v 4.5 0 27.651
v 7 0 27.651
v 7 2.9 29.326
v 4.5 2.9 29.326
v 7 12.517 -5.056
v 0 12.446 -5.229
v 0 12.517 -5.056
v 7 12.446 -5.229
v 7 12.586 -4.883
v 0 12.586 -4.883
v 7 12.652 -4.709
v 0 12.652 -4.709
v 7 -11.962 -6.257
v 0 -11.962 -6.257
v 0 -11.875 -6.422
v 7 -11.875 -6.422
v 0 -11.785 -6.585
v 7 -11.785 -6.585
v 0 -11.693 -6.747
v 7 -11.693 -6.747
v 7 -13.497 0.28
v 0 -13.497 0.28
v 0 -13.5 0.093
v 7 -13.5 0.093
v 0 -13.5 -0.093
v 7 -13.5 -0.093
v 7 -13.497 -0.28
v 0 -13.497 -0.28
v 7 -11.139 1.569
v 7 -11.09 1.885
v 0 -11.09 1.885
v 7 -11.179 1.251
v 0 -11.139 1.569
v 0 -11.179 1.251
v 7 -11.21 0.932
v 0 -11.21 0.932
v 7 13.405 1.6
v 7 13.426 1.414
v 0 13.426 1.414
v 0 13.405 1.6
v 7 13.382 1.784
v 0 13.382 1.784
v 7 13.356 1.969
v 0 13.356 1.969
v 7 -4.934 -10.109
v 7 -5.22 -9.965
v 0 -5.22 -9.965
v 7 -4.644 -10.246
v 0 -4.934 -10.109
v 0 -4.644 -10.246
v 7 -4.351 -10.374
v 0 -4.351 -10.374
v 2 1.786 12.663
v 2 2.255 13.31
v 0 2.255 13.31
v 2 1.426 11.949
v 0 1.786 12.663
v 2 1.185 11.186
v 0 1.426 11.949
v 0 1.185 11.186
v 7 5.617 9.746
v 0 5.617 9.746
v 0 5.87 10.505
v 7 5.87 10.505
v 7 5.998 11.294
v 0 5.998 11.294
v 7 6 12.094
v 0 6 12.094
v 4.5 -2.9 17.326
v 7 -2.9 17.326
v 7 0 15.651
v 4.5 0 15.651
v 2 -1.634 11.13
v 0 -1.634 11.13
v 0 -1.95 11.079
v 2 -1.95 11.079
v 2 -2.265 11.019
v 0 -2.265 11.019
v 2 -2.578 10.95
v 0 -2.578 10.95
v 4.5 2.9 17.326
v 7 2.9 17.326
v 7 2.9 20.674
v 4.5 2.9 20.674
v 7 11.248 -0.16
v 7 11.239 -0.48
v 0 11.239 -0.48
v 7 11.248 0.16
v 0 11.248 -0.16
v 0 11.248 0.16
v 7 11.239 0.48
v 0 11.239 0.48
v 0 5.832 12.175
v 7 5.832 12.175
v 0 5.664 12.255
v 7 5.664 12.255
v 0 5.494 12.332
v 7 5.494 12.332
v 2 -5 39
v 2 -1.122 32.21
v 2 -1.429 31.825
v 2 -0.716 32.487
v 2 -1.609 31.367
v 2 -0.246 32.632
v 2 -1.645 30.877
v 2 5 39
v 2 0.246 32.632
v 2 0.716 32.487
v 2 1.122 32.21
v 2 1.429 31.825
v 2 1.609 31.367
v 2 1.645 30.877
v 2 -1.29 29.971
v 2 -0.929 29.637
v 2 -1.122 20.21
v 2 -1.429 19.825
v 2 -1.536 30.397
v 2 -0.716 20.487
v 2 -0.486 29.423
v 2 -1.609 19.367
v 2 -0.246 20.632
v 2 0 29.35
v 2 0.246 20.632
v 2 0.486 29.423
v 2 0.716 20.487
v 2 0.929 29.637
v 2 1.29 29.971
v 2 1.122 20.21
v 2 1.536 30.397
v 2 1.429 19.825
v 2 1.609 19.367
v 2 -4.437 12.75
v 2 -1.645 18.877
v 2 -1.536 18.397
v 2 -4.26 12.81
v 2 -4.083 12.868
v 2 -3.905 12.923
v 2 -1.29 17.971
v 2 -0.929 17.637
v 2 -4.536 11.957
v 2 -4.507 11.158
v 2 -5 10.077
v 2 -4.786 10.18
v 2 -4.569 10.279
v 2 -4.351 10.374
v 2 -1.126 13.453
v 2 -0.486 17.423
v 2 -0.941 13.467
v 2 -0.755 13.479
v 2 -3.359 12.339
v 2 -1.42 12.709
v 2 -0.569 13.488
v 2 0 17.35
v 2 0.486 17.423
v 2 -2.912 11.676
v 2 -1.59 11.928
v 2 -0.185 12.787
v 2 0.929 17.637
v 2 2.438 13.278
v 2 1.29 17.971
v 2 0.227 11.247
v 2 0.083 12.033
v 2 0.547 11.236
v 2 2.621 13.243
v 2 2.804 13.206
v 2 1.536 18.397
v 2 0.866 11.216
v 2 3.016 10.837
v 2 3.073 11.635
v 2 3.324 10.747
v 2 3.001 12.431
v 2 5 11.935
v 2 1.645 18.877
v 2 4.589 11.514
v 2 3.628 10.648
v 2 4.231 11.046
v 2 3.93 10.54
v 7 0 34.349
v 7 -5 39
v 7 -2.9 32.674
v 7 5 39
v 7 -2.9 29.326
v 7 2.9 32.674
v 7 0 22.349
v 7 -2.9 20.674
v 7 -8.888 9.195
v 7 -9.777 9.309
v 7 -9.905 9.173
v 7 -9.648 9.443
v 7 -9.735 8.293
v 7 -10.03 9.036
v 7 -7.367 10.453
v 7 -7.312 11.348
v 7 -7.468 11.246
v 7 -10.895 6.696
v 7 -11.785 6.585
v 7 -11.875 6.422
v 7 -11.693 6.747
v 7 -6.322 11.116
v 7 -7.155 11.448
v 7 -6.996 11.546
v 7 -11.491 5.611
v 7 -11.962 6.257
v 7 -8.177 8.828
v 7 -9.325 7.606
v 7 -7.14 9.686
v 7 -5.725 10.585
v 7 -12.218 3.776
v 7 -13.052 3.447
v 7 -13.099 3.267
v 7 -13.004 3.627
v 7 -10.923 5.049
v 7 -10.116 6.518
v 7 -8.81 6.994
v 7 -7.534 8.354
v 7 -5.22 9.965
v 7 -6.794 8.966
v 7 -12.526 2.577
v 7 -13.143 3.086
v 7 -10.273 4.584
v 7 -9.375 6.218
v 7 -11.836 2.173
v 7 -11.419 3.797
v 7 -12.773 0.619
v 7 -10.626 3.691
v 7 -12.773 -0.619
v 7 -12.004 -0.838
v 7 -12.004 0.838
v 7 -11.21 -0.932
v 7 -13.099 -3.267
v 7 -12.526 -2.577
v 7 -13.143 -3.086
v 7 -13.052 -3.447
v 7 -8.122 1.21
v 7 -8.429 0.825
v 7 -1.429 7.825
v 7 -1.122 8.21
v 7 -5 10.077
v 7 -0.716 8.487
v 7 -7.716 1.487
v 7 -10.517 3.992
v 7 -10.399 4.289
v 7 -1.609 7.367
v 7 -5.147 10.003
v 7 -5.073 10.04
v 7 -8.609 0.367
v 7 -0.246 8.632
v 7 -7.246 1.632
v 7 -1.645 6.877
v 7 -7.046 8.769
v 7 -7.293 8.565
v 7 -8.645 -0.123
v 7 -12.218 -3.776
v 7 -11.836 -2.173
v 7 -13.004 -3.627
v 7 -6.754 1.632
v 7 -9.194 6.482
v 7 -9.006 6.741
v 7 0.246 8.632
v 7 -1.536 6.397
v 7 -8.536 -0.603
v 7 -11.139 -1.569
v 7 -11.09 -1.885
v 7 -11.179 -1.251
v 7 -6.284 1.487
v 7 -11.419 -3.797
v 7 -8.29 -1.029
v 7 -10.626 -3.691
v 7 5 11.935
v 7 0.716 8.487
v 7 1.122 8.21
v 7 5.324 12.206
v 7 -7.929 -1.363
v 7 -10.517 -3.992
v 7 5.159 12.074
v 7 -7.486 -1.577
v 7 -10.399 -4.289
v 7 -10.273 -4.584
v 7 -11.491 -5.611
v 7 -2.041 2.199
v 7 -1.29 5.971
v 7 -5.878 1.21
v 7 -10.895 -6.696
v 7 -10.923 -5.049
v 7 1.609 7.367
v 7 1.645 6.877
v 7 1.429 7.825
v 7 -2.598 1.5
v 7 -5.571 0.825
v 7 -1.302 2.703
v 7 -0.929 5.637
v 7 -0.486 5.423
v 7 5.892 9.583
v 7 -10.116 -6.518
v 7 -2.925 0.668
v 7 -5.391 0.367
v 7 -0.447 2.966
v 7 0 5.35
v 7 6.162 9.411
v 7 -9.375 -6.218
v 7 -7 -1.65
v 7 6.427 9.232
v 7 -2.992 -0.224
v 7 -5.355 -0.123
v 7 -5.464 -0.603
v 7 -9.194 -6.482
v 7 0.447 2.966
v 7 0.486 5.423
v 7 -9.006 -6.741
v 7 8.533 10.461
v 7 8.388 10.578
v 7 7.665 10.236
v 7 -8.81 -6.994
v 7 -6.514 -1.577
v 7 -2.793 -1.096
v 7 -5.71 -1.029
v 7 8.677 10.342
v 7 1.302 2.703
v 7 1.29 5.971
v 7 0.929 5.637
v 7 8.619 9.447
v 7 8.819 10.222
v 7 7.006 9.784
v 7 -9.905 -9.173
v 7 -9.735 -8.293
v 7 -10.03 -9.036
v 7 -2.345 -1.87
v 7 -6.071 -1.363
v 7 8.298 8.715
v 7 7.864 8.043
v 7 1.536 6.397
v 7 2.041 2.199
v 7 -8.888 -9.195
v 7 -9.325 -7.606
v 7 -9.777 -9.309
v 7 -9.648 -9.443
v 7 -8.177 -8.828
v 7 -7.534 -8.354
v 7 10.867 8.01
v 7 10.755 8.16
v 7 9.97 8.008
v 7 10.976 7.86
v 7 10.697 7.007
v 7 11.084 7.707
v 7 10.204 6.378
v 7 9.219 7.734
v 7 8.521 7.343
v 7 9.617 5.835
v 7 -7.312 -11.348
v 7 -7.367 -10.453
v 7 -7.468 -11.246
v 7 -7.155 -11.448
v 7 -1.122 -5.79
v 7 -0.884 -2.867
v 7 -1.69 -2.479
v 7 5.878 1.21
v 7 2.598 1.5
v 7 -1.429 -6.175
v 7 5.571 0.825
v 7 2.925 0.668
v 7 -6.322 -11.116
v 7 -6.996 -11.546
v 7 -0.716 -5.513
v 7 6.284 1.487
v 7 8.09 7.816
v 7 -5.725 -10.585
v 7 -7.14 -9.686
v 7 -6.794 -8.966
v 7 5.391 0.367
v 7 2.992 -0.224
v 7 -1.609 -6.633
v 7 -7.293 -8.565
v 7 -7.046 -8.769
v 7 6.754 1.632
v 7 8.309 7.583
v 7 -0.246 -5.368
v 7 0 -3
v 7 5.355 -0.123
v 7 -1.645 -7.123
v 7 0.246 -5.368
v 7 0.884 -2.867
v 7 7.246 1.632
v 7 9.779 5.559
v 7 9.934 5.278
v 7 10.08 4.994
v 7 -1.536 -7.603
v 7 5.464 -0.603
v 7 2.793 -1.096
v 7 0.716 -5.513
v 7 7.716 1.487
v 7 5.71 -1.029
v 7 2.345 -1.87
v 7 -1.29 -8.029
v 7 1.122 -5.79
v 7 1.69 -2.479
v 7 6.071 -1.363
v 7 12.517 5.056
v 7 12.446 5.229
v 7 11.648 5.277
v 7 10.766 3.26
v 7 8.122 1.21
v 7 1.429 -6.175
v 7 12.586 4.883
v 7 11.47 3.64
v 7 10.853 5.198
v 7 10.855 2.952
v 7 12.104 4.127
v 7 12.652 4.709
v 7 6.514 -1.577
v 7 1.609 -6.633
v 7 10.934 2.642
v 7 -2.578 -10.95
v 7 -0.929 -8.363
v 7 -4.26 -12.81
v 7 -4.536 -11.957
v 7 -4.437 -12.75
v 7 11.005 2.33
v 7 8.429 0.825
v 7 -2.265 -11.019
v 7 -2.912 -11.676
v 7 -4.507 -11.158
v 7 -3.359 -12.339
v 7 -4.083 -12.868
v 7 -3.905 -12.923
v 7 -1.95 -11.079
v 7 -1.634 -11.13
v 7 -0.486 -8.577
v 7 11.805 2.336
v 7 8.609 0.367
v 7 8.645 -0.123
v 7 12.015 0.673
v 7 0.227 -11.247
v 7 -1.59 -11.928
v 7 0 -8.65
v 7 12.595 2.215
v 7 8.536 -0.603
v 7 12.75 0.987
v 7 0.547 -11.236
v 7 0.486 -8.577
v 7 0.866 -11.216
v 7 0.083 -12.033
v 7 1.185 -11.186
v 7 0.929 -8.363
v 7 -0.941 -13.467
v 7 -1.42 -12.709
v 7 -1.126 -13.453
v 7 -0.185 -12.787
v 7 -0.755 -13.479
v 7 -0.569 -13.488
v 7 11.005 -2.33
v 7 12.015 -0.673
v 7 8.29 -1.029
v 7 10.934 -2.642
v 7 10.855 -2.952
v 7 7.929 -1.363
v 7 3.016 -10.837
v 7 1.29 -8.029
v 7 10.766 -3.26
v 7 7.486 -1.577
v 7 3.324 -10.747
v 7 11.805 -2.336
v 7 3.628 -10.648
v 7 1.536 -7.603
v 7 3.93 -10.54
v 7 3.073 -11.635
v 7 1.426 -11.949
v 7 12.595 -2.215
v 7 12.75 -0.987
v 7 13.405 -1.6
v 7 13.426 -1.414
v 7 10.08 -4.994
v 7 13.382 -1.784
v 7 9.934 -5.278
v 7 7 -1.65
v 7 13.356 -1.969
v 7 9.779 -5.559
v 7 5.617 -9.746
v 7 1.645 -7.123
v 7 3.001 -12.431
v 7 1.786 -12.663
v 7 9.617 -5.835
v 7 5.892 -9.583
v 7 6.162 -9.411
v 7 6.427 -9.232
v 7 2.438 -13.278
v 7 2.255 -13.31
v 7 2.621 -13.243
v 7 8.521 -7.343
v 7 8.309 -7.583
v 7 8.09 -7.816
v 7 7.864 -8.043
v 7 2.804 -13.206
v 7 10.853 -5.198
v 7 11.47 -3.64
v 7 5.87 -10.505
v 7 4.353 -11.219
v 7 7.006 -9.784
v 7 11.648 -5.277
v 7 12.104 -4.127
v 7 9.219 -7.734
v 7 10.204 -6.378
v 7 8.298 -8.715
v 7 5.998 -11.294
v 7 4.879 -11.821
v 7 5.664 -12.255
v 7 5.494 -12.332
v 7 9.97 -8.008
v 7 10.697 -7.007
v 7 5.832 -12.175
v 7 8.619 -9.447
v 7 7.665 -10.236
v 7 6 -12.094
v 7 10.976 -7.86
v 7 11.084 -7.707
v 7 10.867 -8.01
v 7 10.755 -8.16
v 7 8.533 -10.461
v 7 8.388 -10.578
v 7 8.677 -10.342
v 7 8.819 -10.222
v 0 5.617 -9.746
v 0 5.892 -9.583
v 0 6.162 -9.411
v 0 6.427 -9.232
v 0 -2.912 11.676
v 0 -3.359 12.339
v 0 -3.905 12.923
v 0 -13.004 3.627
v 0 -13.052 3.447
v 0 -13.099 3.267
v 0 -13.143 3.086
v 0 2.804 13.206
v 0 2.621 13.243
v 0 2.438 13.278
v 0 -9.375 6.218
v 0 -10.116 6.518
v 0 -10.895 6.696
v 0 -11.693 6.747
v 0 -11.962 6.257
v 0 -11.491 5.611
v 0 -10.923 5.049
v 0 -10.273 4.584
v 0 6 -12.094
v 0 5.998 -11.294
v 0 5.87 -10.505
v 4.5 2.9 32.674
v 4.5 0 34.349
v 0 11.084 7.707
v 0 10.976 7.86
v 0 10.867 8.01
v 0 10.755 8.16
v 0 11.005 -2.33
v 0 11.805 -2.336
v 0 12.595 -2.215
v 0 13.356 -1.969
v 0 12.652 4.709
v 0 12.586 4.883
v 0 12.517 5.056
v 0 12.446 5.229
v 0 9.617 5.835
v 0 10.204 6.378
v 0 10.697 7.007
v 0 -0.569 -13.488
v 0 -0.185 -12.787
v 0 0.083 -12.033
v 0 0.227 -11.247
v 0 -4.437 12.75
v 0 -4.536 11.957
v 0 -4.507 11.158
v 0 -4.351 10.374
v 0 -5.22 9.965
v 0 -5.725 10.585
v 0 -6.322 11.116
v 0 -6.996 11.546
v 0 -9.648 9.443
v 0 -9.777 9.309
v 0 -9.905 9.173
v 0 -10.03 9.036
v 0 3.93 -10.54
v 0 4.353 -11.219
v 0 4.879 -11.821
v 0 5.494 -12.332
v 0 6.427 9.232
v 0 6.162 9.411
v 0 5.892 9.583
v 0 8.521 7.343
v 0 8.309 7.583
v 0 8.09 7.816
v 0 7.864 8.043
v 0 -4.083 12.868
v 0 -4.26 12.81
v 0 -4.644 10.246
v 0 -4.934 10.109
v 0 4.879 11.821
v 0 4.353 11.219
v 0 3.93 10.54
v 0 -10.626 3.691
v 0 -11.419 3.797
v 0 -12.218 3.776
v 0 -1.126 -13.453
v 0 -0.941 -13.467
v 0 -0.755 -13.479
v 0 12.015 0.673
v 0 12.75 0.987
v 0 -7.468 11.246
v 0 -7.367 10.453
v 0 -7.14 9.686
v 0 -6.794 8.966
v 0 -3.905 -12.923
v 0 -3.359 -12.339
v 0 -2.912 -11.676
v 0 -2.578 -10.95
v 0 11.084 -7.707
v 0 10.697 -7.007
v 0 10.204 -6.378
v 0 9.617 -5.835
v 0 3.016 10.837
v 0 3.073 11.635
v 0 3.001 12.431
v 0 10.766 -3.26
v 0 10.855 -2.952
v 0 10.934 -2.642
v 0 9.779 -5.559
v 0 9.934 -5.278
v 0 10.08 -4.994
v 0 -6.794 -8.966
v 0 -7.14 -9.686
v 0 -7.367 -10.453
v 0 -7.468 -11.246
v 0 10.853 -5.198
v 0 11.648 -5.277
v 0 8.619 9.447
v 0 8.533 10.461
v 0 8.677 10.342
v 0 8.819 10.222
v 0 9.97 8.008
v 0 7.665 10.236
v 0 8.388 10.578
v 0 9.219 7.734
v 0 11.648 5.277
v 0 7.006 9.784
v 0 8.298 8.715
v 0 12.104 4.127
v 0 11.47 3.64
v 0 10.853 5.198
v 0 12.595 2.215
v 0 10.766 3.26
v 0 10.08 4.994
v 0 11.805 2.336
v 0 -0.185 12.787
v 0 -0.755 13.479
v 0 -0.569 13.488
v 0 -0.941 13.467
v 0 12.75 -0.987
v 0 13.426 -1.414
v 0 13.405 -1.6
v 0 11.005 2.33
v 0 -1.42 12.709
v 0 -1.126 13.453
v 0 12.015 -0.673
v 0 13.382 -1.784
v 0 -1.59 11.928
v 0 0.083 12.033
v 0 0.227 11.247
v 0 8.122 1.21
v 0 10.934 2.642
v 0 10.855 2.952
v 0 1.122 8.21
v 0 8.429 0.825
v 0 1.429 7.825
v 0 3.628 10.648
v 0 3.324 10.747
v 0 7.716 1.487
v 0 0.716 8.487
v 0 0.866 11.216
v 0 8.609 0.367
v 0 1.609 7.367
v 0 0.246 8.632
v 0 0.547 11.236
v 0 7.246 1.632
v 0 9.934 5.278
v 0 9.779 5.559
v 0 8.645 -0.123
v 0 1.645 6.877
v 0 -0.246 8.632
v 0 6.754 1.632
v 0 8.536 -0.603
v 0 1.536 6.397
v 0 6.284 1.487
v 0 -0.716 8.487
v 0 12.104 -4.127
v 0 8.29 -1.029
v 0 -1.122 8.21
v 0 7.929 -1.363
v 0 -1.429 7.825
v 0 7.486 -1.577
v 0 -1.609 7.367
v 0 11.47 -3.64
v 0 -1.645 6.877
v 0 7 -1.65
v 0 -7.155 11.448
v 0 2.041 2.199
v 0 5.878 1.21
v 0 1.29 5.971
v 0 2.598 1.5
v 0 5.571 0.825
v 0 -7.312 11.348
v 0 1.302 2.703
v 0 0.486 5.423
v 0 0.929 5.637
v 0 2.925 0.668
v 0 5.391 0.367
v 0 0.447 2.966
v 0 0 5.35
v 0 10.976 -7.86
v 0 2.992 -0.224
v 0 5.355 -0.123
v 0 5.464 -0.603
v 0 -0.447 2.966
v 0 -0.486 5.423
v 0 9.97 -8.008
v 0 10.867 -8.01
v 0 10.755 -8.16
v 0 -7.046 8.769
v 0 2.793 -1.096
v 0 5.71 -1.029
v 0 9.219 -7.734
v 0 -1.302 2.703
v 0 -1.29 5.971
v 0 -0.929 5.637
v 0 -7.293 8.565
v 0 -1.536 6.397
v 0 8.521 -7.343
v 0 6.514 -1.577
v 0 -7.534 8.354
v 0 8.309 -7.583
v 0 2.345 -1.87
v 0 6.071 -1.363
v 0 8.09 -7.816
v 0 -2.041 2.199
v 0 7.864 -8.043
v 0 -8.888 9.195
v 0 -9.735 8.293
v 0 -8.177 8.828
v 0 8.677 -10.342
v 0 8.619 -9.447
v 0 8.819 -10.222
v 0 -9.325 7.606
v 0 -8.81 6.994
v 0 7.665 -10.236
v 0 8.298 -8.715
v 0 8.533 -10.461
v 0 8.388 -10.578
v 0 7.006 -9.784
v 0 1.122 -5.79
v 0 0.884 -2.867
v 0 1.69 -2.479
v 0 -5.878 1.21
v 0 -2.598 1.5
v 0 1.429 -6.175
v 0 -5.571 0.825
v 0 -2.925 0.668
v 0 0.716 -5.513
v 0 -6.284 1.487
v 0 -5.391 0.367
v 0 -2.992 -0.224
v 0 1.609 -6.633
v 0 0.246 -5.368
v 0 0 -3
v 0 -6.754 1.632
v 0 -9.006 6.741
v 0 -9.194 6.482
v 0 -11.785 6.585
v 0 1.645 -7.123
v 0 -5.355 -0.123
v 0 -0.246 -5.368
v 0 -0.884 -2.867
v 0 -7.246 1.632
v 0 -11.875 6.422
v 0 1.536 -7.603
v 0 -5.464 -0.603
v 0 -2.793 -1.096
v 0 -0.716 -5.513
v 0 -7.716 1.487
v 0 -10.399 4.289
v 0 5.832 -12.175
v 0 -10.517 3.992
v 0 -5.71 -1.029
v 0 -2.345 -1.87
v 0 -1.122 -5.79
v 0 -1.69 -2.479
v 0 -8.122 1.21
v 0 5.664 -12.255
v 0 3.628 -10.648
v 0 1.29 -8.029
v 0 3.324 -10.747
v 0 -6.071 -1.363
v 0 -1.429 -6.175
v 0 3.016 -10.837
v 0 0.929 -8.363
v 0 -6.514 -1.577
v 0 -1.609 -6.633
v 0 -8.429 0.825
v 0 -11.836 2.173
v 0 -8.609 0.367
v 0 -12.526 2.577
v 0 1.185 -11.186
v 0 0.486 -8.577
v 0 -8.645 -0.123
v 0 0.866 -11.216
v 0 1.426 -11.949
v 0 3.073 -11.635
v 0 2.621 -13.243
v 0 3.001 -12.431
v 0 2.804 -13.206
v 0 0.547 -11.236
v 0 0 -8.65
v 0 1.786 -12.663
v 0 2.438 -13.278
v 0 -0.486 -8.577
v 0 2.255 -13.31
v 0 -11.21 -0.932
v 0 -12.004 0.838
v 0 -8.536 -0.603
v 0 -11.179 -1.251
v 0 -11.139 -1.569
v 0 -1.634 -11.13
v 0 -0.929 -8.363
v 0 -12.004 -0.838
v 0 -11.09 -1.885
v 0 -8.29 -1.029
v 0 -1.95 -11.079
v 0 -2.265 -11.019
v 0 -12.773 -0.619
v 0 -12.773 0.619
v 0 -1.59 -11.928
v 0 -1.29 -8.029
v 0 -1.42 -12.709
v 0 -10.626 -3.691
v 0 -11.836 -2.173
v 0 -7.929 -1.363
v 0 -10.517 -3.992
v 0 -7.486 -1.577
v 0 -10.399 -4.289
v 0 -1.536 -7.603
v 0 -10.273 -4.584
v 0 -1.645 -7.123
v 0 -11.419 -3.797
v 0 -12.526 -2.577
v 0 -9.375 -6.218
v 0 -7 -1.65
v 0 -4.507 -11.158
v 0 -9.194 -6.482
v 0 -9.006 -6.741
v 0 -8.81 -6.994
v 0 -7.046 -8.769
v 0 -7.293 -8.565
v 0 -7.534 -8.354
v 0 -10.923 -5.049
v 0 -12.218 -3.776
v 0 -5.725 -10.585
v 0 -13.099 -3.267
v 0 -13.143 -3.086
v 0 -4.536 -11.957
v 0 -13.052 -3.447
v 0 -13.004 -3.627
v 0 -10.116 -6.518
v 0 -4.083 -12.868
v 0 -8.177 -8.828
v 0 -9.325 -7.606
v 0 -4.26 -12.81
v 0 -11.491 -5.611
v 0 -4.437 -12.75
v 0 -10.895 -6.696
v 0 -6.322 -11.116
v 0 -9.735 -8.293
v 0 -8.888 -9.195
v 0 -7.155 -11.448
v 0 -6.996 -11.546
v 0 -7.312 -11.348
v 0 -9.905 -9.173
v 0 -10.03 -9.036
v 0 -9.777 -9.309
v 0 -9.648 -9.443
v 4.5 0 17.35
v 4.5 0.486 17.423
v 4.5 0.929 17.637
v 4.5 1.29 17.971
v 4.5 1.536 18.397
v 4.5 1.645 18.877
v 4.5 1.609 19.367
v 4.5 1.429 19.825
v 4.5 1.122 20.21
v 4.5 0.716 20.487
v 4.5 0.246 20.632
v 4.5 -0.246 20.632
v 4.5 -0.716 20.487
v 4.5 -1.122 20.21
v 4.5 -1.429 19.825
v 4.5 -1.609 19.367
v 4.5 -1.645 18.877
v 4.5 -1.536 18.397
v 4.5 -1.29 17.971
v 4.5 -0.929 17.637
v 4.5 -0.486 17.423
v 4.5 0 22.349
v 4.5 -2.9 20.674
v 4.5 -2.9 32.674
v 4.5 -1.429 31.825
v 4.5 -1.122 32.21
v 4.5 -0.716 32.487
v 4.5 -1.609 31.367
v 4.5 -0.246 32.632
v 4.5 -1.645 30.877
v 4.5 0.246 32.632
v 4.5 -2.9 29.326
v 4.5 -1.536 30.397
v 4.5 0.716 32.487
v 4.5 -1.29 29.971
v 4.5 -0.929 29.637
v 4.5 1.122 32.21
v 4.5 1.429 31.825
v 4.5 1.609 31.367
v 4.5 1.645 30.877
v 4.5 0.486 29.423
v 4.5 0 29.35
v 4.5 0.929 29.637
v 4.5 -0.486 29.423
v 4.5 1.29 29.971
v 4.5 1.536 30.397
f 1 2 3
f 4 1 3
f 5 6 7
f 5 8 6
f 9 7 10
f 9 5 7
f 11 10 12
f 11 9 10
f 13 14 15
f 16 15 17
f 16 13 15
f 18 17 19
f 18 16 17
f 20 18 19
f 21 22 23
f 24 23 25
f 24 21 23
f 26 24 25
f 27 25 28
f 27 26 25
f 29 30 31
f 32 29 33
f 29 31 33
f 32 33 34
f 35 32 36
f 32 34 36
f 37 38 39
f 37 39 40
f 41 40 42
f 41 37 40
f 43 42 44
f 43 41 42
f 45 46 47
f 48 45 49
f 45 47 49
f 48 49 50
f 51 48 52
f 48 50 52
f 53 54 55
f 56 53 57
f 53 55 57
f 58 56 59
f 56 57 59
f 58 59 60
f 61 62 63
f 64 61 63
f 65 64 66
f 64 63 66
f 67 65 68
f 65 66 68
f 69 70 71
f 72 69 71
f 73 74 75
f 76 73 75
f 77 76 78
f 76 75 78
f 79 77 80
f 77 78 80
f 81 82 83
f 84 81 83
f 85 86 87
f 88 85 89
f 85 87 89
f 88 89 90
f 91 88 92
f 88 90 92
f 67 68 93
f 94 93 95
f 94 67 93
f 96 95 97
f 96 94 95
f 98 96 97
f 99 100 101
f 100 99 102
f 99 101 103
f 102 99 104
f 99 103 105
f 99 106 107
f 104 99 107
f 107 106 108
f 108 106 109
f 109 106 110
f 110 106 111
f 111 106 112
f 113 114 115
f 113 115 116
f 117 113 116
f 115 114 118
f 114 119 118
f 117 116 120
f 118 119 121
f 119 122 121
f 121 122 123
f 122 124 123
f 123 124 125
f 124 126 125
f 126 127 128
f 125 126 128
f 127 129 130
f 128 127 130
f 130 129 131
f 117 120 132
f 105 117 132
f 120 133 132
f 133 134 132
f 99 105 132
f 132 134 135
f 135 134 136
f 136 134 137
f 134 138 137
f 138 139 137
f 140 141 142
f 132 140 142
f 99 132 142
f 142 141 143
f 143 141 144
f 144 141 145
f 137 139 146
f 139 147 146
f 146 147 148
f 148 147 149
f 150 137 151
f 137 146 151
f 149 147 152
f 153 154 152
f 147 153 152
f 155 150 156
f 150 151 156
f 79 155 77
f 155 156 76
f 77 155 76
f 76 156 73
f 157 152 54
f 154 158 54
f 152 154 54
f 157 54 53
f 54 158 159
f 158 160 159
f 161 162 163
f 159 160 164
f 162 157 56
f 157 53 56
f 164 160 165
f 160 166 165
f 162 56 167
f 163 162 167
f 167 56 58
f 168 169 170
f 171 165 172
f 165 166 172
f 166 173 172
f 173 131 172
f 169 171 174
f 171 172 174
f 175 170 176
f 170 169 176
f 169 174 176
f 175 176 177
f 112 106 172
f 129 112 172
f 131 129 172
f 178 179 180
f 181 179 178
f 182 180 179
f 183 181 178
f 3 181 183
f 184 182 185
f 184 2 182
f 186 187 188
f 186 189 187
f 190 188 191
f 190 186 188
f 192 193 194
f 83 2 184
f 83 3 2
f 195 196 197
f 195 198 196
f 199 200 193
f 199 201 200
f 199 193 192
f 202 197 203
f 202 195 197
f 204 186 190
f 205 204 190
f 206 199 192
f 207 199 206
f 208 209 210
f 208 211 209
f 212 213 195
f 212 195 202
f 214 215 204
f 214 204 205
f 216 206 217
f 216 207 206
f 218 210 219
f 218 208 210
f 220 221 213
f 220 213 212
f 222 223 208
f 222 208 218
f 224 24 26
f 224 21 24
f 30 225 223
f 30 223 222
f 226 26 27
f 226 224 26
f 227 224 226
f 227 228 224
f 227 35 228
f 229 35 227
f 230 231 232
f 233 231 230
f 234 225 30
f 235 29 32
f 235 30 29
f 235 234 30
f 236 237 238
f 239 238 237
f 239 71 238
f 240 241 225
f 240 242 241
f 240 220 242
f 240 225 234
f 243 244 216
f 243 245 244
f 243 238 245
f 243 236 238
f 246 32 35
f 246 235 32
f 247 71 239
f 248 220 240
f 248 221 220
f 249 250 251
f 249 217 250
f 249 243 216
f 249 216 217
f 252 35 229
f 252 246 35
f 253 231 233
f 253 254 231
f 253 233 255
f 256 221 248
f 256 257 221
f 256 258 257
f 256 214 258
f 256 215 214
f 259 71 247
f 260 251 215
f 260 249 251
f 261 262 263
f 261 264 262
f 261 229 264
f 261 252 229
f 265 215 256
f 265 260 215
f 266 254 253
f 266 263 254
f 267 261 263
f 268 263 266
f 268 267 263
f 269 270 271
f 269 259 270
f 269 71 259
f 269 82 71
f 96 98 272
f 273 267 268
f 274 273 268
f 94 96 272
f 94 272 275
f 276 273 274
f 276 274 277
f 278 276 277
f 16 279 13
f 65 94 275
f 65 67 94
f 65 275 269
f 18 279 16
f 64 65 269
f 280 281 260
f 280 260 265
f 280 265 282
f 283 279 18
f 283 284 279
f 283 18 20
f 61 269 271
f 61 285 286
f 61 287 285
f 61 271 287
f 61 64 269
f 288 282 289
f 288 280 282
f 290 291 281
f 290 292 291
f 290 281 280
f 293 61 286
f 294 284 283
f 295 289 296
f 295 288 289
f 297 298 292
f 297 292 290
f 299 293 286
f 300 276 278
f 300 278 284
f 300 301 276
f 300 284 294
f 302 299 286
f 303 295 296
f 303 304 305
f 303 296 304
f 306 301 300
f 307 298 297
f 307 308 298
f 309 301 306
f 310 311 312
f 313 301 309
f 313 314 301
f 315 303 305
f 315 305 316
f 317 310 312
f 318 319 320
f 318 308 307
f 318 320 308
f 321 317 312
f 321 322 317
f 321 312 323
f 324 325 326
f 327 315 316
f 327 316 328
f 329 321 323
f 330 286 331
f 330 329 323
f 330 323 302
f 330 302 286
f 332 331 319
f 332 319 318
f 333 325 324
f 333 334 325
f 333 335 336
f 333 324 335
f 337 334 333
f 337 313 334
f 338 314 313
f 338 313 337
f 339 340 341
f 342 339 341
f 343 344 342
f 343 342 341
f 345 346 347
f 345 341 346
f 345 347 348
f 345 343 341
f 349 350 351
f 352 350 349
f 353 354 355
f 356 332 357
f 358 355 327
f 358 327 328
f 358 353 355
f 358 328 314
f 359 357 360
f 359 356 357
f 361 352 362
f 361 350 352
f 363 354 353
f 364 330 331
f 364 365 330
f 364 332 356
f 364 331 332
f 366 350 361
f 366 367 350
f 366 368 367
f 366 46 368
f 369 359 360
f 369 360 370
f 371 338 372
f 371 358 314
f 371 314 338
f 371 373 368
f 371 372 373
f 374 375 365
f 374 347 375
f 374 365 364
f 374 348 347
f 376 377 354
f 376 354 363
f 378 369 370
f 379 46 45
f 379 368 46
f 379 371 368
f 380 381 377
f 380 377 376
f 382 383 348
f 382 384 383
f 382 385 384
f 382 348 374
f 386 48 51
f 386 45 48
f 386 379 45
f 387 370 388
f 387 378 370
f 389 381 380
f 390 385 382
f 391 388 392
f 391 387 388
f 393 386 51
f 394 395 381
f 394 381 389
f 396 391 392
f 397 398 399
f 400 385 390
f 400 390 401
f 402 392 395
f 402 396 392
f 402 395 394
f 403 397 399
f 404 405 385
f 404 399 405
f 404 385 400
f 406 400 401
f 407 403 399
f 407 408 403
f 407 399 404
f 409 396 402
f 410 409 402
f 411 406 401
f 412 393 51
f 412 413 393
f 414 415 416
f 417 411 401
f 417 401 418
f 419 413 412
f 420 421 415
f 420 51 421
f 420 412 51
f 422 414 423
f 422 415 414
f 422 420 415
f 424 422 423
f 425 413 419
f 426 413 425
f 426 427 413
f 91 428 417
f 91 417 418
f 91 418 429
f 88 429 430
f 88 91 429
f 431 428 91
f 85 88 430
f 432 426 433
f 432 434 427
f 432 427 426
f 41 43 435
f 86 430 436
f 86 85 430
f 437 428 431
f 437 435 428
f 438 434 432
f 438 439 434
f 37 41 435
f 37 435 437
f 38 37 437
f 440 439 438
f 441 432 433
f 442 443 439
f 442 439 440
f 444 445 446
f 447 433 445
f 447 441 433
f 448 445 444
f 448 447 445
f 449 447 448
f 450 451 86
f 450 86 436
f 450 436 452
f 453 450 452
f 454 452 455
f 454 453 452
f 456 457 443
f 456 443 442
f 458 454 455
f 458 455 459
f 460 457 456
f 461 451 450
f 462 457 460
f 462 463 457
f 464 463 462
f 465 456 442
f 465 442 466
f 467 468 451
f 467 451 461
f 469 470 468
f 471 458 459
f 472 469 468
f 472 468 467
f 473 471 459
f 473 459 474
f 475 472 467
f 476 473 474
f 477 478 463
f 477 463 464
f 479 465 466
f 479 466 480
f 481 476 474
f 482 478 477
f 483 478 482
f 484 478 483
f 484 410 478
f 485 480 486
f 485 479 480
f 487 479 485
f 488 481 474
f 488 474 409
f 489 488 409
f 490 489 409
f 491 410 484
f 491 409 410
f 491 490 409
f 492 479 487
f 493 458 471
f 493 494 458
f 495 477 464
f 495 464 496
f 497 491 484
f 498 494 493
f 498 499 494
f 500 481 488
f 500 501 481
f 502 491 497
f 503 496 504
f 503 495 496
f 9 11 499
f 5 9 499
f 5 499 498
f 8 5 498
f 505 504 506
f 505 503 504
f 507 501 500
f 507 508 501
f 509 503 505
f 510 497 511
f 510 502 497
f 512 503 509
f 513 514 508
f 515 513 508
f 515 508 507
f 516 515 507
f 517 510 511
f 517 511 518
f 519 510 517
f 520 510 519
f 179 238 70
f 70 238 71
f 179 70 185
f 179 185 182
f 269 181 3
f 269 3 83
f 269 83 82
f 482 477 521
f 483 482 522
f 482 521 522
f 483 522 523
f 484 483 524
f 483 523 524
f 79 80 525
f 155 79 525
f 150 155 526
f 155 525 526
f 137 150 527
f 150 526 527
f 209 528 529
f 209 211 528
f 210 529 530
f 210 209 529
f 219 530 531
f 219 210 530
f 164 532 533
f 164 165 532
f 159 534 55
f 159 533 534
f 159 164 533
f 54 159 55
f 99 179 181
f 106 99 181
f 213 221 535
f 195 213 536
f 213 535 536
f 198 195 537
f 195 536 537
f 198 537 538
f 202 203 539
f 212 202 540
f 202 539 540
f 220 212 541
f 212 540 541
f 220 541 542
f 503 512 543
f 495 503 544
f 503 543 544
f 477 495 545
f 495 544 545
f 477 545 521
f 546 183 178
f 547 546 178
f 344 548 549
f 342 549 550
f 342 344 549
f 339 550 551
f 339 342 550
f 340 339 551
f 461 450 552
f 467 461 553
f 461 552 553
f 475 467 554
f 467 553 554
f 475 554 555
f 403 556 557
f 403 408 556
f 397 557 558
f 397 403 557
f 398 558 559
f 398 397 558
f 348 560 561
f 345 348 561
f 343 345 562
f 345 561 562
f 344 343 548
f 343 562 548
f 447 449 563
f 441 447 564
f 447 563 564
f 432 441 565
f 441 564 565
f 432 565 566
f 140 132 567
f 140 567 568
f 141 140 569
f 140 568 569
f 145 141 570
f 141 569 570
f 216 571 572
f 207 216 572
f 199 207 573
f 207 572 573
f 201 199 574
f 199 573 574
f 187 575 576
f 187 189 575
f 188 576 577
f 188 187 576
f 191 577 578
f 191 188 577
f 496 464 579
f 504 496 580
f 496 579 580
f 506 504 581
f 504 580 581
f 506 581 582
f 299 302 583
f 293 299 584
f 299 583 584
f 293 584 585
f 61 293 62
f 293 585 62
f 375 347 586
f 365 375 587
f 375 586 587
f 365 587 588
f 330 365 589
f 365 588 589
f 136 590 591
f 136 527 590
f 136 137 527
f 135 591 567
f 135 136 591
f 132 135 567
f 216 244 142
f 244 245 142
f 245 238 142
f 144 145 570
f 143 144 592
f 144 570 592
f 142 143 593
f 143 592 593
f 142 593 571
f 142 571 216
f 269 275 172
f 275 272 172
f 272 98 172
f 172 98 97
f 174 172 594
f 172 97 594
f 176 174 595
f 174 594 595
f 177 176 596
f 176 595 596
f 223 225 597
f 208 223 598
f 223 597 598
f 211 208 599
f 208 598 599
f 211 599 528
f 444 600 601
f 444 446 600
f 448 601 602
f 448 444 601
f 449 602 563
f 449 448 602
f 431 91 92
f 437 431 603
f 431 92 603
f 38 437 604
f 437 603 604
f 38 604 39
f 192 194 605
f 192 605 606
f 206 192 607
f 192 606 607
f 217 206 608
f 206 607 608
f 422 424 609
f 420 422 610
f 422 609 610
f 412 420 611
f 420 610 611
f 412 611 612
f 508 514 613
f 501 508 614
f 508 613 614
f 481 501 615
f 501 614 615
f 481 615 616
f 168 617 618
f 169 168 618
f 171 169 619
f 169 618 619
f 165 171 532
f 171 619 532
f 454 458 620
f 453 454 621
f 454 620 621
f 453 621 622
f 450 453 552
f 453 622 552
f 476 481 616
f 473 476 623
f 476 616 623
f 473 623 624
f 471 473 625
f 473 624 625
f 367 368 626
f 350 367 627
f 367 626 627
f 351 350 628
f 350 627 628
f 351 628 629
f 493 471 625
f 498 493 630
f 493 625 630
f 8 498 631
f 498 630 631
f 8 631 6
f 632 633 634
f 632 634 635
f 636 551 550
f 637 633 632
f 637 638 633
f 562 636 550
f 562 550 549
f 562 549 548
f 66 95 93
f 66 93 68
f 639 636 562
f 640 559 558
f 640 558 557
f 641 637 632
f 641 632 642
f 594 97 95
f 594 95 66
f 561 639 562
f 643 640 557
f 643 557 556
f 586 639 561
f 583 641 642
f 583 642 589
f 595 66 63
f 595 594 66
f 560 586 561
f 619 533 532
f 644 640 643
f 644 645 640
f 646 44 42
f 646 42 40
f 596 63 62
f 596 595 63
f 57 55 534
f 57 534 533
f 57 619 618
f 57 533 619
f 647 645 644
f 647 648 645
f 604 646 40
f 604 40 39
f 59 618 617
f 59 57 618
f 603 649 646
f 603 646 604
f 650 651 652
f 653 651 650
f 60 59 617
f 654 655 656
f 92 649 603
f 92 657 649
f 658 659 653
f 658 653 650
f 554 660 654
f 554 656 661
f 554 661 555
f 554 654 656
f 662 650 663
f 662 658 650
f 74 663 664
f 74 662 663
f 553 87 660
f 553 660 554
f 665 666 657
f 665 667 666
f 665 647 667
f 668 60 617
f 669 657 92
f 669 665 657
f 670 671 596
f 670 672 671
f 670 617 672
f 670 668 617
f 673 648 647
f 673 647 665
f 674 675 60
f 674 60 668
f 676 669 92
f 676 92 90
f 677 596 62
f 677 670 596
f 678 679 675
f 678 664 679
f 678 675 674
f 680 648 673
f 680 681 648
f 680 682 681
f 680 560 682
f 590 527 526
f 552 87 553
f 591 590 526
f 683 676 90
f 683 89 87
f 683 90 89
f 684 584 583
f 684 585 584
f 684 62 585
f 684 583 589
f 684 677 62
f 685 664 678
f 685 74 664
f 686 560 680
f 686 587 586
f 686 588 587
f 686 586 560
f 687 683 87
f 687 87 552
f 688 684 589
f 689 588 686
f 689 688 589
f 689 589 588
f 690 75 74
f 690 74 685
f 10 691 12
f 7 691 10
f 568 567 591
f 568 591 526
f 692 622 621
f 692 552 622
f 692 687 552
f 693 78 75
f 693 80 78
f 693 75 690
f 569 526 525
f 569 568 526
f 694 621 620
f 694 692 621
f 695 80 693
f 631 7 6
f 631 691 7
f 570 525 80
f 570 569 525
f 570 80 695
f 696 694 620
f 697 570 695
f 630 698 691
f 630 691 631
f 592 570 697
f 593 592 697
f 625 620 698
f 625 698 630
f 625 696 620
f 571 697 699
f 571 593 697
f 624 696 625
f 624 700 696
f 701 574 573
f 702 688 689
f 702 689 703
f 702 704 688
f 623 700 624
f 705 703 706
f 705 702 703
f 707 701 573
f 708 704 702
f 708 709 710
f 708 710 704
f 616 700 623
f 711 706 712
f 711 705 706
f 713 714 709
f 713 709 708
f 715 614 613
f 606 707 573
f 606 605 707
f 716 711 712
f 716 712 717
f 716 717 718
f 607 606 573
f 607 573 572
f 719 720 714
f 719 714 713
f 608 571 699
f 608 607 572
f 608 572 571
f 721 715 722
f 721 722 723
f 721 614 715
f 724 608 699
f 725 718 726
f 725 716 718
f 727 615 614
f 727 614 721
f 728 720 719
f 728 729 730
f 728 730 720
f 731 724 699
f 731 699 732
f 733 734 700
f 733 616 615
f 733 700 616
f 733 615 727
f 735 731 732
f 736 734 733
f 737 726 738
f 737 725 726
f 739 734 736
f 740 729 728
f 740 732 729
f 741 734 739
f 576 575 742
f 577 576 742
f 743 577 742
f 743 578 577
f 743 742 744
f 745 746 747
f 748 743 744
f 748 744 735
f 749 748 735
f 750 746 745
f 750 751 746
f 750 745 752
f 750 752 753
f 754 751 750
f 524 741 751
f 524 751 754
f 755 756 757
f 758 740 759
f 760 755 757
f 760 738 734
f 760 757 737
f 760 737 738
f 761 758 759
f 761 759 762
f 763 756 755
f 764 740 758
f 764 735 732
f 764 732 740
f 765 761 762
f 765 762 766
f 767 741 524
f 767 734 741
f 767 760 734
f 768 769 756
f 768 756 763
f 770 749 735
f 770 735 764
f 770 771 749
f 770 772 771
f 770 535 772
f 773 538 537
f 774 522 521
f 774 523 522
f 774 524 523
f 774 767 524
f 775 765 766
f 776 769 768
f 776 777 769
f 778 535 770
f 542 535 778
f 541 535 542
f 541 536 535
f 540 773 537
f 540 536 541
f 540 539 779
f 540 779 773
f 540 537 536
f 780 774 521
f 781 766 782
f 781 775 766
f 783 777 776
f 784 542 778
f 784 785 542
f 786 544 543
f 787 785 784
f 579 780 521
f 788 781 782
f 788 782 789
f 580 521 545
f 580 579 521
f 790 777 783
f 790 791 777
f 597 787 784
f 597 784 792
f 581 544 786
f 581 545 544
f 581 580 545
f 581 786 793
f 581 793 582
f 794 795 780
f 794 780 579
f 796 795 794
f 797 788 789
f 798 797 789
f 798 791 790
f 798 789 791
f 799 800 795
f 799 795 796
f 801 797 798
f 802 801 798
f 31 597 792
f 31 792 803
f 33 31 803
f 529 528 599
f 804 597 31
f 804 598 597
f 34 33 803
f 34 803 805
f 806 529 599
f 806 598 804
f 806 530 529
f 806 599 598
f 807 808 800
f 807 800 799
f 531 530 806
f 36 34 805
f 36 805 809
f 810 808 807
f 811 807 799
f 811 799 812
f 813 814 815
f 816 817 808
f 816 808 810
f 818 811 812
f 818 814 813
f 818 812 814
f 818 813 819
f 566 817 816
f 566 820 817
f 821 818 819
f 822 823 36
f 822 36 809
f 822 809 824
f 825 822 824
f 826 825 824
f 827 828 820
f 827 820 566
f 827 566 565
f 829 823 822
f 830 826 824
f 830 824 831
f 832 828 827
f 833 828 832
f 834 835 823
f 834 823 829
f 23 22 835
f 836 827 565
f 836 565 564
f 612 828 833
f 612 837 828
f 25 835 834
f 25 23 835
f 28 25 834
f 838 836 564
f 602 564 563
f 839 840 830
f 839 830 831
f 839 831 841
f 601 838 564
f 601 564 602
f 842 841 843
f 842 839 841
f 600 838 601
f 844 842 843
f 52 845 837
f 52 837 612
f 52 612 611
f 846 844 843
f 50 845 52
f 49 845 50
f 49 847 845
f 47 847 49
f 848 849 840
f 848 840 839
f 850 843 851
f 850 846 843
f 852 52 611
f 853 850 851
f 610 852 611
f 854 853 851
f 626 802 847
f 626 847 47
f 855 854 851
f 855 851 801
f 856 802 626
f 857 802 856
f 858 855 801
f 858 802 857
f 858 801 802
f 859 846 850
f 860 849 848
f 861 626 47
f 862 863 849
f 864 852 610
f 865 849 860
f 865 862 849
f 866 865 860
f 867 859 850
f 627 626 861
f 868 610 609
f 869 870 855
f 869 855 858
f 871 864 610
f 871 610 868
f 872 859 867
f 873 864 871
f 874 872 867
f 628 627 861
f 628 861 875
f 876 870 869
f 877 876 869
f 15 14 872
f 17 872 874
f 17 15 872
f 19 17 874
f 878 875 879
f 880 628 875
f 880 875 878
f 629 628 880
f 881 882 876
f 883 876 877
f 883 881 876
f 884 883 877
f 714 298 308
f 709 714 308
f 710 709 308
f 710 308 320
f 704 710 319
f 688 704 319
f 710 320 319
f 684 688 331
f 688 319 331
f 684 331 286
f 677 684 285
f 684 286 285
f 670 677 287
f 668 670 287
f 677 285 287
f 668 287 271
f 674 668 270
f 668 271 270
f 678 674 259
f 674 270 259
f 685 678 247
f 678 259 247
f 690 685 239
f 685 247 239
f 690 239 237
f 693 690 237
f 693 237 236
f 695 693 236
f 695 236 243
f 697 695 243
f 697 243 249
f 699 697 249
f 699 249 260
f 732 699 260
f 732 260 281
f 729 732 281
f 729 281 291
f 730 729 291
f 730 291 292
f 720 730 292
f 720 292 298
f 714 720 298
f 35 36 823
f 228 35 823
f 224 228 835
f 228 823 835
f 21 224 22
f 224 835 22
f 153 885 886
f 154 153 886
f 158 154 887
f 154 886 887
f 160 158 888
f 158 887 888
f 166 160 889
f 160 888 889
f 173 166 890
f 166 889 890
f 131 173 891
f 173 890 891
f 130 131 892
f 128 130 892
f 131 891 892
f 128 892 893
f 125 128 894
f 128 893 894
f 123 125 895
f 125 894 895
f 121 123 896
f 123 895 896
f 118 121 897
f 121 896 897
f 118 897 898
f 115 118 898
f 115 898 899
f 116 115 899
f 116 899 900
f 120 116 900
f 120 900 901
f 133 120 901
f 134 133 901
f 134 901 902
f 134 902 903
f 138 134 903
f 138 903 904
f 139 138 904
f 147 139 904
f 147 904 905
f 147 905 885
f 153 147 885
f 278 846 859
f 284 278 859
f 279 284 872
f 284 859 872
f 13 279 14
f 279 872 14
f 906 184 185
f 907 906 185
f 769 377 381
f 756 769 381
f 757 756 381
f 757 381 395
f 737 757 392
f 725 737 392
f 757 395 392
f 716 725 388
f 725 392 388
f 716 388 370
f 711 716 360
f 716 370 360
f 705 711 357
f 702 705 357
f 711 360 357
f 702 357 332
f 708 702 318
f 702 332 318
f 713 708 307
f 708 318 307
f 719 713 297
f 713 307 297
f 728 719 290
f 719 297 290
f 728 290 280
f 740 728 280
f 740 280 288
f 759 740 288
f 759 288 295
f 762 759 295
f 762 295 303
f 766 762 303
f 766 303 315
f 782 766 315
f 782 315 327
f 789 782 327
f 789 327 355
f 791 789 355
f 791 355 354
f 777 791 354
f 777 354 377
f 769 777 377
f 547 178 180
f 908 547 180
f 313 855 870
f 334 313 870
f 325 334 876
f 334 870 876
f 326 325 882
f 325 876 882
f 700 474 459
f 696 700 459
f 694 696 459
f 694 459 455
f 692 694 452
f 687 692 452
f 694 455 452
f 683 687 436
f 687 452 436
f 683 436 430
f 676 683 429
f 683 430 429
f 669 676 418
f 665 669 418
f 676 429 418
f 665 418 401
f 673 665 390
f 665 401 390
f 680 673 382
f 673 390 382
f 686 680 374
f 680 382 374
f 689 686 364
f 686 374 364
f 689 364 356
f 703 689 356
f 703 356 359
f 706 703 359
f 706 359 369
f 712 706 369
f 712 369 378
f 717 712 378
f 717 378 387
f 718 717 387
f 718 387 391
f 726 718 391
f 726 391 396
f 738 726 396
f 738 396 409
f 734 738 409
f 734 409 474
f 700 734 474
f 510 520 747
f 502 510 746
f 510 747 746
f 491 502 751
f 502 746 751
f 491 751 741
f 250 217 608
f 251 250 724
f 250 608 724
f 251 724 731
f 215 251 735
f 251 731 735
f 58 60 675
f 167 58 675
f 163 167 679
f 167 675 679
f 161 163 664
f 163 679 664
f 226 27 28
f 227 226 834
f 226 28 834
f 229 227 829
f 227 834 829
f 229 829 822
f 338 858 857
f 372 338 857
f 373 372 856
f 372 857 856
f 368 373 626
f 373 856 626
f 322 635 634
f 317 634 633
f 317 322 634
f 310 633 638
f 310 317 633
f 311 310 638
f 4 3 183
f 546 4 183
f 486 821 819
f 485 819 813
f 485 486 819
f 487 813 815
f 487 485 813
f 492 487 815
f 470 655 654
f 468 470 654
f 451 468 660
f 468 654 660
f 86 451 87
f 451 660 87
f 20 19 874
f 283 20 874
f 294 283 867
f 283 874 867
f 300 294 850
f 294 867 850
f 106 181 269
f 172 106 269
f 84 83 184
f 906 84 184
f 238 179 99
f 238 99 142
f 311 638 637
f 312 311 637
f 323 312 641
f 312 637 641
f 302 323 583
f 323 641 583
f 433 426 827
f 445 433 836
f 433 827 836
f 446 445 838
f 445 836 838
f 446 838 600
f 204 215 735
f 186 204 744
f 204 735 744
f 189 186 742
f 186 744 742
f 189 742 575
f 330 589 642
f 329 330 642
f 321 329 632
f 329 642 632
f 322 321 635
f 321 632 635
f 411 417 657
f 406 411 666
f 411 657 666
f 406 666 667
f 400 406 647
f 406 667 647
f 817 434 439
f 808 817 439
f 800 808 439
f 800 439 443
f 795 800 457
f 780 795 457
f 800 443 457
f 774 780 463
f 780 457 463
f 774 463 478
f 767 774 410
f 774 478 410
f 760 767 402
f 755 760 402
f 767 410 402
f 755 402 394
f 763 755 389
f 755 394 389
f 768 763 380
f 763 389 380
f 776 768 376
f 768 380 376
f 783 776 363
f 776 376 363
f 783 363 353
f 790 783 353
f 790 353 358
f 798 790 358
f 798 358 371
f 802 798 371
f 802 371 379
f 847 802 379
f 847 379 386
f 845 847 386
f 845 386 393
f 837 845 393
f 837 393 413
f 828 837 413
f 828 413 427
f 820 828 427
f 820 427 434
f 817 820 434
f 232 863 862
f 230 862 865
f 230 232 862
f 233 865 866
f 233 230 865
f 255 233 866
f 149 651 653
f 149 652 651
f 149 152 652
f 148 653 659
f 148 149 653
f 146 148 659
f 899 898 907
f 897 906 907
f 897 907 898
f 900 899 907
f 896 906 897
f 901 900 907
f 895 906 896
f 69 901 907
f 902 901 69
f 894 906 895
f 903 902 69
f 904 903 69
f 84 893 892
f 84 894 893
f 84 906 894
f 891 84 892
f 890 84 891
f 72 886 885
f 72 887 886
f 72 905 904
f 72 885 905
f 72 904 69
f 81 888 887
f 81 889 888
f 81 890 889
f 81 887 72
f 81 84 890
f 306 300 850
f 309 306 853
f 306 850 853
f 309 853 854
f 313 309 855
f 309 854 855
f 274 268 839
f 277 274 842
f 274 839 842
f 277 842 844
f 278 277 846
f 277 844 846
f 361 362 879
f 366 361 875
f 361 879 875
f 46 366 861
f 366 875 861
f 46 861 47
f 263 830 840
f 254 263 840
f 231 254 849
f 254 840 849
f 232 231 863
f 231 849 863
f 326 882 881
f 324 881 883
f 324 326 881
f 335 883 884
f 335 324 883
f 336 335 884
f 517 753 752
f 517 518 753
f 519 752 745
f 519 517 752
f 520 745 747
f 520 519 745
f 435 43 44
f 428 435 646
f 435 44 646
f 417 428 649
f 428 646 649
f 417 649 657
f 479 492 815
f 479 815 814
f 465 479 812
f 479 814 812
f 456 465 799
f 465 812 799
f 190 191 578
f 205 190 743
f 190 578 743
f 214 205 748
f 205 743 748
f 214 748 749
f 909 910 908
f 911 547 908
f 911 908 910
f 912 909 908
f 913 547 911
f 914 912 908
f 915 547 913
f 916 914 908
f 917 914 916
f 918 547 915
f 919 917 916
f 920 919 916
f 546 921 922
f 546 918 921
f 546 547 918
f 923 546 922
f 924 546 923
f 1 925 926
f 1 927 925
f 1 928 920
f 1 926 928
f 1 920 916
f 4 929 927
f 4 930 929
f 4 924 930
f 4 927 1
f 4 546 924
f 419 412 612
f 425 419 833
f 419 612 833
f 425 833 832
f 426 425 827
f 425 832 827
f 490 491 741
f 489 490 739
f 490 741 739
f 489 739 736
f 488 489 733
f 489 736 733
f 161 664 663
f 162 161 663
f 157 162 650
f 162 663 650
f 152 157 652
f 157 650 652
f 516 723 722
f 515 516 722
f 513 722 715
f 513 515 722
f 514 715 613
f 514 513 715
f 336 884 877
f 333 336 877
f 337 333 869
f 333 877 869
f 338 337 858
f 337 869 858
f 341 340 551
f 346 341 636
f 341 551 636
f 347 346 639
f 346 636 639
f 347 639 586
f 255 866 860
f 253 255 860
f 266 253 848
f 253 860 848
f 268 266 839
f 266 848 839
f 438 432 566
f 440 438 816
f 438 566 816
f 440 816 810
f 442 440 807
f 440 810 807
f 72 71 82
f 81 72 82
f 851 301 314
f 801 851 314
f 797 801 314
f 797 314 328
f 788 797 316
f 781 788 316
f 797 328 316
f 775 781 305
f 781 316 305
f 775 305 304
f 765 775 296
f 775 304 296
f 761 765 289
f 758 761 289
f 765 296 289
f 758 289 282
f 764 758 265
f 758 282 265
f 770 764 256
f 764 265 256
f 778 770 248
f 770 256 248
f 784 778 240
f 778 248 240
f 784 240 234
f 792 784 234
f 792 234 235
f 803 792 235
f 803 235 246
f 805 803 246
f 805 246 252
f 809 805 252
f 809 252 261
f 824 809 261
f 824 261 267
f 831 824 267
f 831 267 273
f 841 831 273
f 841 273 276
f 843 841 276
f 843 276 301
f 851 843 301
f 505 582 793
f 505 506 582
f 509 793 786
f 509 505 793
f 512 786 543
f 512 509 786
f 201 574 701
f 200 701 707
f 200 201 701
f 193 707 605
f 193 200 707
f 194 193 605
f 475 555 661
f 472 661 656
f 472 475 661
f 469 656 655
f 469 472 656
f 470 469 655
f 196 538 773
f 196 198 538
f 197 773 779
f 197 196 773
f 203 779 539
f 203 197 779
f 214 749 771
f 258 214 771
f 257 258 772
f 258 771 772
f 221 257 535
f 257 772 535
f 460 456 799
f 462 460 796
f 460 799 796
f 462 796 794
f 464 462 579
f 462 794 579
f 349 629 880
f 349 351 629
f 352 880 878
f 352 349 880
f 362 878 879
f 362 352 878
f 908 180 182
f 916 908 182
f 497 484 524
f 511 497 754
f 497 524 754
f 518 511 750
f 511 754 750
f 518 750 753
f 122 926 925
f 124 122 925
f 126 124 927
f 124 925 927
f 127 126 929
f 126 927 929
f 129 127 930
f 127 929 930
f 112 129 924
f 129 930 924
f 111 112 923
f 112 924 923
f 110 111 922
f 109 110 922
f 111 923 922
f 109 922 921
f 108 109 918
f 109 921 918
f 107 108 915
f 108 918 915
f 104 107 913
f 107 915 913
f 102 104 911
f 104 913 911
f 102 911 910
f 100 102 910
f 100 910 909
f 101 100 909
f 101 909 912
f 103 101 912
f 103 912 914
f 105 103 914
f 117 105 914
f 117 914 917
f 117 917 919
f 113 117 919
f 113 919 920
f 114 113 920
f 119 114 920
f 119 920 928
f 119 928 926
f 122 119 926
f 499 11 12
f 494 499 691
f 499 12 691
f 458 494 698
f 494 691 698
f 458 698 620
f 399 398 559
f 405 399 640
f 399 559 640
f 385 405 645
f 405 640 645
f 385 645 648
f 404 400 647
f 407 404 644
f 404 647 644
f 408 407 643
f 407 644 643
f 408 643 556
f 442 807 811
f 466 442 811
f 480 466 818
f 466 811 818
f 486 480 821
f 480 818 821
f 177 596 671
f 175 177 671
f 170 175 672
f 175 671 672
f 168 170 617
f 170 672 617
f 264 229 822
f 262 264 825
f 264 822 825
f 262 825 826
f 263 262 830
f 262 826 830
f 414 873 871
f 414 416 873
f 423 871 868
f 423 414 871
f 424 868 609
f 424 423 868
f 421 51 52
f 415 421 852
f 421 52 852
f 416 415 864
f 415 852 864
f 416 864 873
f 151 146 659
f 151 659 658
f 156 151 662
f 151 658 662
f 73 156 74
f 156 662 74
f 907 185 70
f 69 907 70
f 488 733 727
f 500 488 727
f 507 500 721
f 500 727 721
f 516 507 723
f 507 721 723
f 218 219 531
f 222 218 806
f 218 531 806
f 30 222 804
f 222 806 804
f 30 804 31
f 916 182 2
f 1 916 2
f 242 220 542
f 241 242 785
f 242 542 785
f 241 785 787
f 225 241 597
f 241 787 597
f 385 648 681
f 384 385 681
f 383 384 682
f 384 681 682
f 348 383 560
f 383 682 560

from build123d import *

# Parameters (mm, degrees)
BASPROSKE_W         = 7
BASPROSKE_H         = 13.5
TOOTHCUT_DEPTH      = 21.334699408
TEETHCUTS_COUNT     = 25
TEETHCUTS_ANGLE     = 345.6
BORSKE_R            = 0.4
BORE_DEPTH          = 50.0000508
SKETCH_1_R          = 3
SKETCH_1_R_2        = 1.65
CUT_EXTRUDE_1_DEPTH = 10
SKETCH_2_W          = 30
SKETCH_2_H          = 10
SKETCH_2_R          = 1.65
EXTRUDE_2_DEPTH     = 5
CUT_EXTRUDE_2_DEPTH = 2.5


with BuildPart() as part:
    # BasProSke → Base-Revolve (revolve)
    with BuildSketch(Plane(origin=(0, 0, 0), x_dir=(1, 0, 0), z_dir=(0, 1, 0)), mode=Mode.PRIVATE) as base_revolve_sk:
        with Locations((3.5, 6.75)):
            Rectangle(BASPROSKE_W, BASPROSKE_H)
    revolve(base_revolve_sk.sketch.rotate(Axis((-10, 0, 0), (1, 0, 0)), 180), axis=Axis((-10, 0, 0), (1, 0, 0)))

    # TooCutSke → ToothCut (cut, through all)
    with BuildSketch(Plane(origin=(0, 0, 0), x_dir=(0, 0, -1), z_dir=(1, 0, 0))):
        with BuildLine():
            ThreePointArc((0.480087995, 11.238750665), (0, 11.249), (-0.480087995, 11.238750665))
            ThreePointArc((-0.480087995, 11.238750665), (-0.821124963, 12.40220054), (-1.432168974, 13.449361962))
            ThreePointArc((-1.432168974, 13.449361962), (0, 13.5254), (1.432168974, 13.449361962))
            ThreePointArc((1.432168974, 13.449361962), (0.821124963, 12.40220054), (0.480087995, 11.238750665))
        make_face()
    toothcut = extrude(amount=TOOTHCUT_DEPTH, mode=Mode.SUBTRACT)

    # TeethCuts: ToothCut ×25 about axis
    teethcuts_axis = Axis((-10, 0, 0), (1, 0, 0))
    for i in range(1, TEETHCUTS_COUNT):
        add(toothcut.rotate(teethcuts_axis, i * TEETHCUTS_ANGLE / (TEETHCUTS_COUNT - 1)), mode=Mode.SUBTRACT)

    # BorSke → Bore (cut, symmetric)
    with BuildSketch(Plane(origin=(0, 0, 0), x_dir=(0, 0, -1), z_dir=(1, 0, 0))):
        with Locations(Location((0, 0, 0), (0, 0, 180))):
            Circle(BORSKE_R)
    extrude(amount=BORE_DEPTH, both=True, mode=Mode.SUBTRACT)

    # 草图1 → 切除-拉伸1 (cut)
    with BuildSketch(Plane(origin=(7, 0, 0), x_dir=(0, 0, -1), z_dir=(1, 0, 0))):
        Circle(SKETCH_1_R)
        with Locations((0, 7)):
            Circle(SKETCH_1_R_2)
        with Locations((7, 0)):
            Circle(SKETCH_1_R_2)
        with Locations((-7, 0)):
            Circle(SKETCH_1_R_2)
        with Locations((0, -7)):
            Circle(SKETCH_1_R_2)
    extrude(amount=-CUT_EXTRUDE_1_DEPTH, mode=Mode.SUBTRACT)

    # 草图2 → 凸台-拉伸2 (add)
    with BuildSketch(Plane(origin=(7, 0, 0), x_dir=(0, 0, -1), z_dir=(1, 0, 0))):
        with Locations((-24, 0)):
            Rectangle(SKETCH_2_W, SKETCH_2_H)
        with Locations((-31, 0)):
            Circle(SKETCH_2_R, mode=Mode.SUBTRACT)
        with Locations((-19, 0)):
            Circle(SKETCH_2_R, mode=Mode.SUBTRACT)
    extrude(amount=-EXTRUDE_2_DEPTH)

    # 草图3 → 切除-拉伸2 (cut)
    with BuildSketch(Plane(origin=(7, 0, 0), x_dir=(0, 0, -1), z_dir=(1, 0, 0))):
        Polygon((-15.651368439, 0), (-17.325684219, 2.9), (-20.674315781, 2.9), (-22.348631561, 0), (-20.674315781, -2.9), (-17.325684219, -2.9), align=None)
        Polygon((-27.651368439, 0), (-29.325684219, 2.9), (-32.674315781, 2.9), (-34.348631561, 0), (-32.674315781, -2.9), (-29.325684219, -2.9), align=None)
    extrude(amount=-CUT_EXTRUDE_2_DEPTH, mode=Mode.SUBTRACT)


solid = part.part
